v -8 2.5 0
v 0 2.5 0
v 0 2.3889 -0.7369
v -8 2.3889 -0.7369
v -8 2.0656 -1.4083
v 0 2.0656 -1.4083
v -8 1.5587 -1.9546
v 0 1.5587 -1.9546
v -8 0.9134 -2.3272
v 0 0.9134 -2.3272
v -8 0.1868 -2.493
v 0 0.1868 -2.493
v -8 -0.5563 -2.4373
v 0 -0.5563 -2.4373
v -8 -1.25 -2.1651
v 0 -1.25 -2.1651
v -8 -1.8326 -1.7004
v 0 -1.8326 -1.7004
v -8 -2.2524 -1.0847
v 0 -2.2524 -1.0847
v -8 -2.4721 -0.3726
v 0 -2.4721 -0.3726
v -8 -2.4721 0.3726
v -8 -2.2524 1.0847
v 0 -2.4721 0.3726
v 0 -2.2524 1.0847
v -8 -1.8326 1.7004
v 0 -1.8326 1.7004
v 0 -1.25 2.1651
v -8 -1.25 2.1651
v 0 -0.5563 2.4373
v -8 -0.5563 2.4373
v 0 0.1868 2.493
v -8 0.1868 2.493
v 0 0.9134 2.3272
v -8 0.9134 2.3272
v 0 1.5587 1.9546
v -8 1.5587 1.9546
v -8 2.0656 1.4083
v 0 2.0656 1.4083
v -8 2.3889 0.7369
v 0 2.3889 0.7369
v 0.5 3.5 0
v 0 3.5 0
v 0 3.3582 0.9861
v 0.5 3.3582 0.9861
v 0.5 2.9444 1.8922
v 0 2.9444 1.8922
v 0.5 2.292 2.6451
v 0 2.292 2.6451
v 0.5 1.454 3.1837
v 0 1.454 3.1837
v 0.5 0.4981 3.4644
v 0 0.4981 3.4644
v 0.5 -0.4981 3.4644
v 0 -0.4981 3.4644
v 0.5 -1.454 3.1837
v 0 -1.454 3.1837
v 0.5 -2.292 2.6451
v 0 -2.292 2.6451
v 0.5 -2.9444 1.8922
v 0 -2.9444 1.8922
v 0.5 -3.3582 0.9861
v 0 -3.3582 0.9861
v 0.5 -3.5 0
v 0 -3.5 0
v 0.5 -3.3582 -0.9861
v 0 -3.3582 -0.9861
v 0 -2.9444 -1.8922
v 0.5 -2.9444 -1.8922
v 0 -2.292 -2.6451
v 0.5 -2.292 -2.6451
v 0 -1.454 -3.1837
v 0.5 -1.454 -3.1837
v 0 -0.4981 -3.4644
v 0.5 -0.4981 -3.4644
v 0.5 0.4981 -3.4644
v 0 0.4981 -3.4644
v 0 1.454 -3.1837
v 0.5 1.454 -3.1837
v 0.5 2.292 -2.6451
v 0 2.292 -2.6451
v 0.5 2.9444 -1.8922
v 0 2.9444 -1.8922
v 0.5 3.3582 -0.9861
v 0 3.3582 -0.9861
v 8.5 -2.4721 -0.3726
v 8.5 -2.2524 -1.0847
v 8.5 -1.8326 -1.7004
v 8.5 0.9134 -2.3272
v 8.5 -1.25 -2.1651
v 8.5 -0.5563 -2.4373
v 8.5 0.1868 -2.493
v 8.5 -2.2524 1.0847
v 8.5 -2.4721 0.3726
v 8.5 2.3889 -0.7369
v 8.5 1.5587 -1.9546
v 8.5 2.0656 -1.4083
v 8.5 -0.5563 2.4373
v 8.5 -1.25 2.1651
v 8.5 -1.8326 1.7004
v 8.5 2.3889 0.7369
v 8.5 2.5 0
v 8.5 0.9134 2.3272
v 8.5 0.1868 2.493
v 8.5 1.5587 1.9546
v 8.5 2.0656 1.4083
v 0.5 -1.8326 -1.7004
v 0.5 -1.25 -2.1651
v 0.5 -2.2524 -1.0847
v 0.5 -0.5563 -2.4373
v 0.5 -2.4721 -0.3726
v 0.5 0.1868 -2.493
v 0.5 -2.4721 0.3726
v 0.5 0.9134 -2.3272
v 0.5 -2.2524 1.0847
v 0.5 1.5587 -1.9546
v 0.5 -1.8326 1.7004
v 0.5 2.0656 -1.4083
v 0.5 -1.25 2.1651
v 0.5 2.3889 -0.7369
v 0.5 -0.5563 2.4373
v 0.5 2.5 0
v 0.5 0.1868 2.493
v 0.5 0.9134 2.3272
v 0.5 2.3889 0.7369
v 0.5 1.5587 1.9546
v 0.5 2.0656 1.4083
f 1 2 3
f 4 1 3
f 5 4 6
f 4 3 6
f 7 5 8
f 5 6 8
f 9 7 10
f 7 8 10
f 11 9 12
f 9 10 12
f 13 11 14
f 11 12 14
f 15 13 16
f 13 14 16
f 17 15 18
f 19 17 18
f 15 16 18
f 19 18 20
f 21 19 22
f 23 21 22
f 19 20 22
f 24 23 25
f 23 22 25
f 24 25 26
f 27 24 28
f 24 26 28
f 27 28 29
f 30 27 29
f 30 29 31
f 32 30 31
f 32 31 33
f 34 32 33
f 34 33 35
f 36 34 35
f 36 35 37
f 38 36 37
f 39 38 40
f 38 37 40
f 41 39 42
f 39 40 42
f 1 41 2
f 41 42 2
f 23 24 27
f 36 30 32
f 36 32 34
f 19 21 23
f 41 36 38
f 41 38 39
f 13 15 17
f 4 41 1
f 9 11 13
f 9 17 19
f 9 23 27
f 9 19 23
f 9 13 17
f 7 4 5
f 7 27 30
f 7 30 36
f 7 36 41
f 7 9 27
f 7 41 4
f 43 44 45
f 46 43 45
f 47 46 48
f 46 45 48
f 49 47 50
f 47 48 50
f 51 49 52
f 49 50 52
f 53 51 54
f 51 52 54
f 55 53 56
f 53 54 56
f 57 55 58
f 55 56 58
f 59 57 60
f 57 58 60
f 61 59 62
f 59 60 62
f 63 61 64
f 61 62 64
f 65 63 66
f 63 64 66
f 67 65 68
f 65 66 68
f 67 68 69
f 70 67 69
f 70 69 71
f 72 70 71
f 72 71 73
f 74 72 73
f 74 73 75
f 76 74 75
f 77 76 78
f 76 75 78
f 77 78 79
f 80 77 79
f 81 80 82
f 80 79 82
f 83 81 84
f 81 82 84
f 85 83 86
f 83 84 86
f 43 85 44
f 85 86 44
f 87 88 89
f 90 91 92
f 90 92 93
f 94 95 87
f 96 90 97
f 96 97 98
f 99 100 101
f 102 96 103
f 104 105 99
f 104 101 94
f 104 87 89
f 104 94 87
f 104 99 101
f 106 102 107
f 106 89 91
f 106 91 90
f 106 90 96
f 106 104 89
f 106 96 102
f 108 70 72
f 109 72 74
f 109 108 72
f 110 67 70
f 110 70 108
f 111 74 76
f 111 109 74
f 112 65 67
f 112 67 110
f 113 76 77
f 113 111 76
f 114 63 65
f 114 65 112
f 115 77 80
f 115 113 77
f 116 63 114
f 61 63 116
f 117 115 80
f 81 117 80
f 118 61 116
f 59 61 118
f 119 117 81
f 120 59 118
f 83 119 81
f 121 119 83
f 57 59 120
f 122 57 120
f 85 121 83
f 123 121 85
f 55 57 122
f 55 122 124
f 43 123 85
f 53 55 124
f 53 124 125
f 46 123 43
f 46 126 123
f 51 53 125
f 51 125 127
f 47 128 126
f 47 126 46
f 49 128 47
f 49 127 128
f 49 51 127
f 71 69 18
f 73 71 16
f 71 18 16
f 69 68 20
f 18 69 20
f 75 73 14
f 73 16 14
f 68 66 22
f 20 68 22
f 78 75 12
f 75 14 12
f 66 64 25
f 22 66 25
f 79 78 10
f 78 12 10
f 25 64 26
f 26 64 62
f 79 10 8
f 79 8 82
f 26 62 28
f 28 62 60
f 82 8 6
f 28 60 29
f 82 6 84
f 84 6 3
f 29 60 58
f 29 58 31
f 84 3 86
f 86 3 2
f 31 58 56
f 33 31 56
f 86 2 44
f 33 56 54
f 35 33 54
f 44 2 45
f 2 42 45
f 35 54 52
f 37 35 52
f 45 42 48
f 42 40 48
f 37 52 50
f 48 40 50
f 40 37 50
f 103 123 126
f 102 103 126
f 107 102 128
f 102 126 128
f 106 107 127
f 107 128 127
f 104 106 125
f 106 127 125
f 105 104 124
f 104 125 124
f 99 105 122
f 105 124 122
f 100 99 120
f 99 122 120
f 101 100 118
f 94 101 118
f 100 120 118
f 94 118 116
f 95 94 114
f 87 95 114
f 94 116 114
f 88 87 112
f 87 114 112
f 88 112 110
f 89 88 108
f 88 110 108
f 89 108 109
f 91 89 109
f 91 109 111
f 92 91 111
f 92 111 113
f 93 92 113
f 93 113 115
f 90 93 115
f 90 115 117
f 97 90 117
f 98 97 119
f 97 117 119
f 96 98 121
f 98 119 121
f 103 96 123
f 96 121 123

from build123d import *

# Parameters (mm, degrees)
SKETCH_R     = 3.5
PAD_DEPTH    = 0.5
SKETCH001_R  = 2.5
PAD001_DEPTH = 8
SKETCH002_R  = 2.5
PAD002_DEPTH = 8


with BuildPart() as part:
    # Sketch → Pad (new body)
    with BuildSketch(Plane.YZ):
        Circle(SKETCH_R)
    extrude(amount=PAD_DEPTH)

    # Sketch001 (on Face3 of Pad) → Pad001 (join)
    with BuildSketch(Plane.YZ.offset(0.5)):
        Circle(SKETCH001_R)
    extrude(amount=PAD001_DEPTH)

    # Sketch002 (on Face2 of Pad001) → Pad002 (join)
    with BuildSketch(Plane(origin=(0, 0, 0), x_dir=(0, 1, 0), z_dir=(-1, 0, 0))):
        Circle(SKETCH002_R)
    extrude(amount=PAD002_DEPTH)


solid = part.part
